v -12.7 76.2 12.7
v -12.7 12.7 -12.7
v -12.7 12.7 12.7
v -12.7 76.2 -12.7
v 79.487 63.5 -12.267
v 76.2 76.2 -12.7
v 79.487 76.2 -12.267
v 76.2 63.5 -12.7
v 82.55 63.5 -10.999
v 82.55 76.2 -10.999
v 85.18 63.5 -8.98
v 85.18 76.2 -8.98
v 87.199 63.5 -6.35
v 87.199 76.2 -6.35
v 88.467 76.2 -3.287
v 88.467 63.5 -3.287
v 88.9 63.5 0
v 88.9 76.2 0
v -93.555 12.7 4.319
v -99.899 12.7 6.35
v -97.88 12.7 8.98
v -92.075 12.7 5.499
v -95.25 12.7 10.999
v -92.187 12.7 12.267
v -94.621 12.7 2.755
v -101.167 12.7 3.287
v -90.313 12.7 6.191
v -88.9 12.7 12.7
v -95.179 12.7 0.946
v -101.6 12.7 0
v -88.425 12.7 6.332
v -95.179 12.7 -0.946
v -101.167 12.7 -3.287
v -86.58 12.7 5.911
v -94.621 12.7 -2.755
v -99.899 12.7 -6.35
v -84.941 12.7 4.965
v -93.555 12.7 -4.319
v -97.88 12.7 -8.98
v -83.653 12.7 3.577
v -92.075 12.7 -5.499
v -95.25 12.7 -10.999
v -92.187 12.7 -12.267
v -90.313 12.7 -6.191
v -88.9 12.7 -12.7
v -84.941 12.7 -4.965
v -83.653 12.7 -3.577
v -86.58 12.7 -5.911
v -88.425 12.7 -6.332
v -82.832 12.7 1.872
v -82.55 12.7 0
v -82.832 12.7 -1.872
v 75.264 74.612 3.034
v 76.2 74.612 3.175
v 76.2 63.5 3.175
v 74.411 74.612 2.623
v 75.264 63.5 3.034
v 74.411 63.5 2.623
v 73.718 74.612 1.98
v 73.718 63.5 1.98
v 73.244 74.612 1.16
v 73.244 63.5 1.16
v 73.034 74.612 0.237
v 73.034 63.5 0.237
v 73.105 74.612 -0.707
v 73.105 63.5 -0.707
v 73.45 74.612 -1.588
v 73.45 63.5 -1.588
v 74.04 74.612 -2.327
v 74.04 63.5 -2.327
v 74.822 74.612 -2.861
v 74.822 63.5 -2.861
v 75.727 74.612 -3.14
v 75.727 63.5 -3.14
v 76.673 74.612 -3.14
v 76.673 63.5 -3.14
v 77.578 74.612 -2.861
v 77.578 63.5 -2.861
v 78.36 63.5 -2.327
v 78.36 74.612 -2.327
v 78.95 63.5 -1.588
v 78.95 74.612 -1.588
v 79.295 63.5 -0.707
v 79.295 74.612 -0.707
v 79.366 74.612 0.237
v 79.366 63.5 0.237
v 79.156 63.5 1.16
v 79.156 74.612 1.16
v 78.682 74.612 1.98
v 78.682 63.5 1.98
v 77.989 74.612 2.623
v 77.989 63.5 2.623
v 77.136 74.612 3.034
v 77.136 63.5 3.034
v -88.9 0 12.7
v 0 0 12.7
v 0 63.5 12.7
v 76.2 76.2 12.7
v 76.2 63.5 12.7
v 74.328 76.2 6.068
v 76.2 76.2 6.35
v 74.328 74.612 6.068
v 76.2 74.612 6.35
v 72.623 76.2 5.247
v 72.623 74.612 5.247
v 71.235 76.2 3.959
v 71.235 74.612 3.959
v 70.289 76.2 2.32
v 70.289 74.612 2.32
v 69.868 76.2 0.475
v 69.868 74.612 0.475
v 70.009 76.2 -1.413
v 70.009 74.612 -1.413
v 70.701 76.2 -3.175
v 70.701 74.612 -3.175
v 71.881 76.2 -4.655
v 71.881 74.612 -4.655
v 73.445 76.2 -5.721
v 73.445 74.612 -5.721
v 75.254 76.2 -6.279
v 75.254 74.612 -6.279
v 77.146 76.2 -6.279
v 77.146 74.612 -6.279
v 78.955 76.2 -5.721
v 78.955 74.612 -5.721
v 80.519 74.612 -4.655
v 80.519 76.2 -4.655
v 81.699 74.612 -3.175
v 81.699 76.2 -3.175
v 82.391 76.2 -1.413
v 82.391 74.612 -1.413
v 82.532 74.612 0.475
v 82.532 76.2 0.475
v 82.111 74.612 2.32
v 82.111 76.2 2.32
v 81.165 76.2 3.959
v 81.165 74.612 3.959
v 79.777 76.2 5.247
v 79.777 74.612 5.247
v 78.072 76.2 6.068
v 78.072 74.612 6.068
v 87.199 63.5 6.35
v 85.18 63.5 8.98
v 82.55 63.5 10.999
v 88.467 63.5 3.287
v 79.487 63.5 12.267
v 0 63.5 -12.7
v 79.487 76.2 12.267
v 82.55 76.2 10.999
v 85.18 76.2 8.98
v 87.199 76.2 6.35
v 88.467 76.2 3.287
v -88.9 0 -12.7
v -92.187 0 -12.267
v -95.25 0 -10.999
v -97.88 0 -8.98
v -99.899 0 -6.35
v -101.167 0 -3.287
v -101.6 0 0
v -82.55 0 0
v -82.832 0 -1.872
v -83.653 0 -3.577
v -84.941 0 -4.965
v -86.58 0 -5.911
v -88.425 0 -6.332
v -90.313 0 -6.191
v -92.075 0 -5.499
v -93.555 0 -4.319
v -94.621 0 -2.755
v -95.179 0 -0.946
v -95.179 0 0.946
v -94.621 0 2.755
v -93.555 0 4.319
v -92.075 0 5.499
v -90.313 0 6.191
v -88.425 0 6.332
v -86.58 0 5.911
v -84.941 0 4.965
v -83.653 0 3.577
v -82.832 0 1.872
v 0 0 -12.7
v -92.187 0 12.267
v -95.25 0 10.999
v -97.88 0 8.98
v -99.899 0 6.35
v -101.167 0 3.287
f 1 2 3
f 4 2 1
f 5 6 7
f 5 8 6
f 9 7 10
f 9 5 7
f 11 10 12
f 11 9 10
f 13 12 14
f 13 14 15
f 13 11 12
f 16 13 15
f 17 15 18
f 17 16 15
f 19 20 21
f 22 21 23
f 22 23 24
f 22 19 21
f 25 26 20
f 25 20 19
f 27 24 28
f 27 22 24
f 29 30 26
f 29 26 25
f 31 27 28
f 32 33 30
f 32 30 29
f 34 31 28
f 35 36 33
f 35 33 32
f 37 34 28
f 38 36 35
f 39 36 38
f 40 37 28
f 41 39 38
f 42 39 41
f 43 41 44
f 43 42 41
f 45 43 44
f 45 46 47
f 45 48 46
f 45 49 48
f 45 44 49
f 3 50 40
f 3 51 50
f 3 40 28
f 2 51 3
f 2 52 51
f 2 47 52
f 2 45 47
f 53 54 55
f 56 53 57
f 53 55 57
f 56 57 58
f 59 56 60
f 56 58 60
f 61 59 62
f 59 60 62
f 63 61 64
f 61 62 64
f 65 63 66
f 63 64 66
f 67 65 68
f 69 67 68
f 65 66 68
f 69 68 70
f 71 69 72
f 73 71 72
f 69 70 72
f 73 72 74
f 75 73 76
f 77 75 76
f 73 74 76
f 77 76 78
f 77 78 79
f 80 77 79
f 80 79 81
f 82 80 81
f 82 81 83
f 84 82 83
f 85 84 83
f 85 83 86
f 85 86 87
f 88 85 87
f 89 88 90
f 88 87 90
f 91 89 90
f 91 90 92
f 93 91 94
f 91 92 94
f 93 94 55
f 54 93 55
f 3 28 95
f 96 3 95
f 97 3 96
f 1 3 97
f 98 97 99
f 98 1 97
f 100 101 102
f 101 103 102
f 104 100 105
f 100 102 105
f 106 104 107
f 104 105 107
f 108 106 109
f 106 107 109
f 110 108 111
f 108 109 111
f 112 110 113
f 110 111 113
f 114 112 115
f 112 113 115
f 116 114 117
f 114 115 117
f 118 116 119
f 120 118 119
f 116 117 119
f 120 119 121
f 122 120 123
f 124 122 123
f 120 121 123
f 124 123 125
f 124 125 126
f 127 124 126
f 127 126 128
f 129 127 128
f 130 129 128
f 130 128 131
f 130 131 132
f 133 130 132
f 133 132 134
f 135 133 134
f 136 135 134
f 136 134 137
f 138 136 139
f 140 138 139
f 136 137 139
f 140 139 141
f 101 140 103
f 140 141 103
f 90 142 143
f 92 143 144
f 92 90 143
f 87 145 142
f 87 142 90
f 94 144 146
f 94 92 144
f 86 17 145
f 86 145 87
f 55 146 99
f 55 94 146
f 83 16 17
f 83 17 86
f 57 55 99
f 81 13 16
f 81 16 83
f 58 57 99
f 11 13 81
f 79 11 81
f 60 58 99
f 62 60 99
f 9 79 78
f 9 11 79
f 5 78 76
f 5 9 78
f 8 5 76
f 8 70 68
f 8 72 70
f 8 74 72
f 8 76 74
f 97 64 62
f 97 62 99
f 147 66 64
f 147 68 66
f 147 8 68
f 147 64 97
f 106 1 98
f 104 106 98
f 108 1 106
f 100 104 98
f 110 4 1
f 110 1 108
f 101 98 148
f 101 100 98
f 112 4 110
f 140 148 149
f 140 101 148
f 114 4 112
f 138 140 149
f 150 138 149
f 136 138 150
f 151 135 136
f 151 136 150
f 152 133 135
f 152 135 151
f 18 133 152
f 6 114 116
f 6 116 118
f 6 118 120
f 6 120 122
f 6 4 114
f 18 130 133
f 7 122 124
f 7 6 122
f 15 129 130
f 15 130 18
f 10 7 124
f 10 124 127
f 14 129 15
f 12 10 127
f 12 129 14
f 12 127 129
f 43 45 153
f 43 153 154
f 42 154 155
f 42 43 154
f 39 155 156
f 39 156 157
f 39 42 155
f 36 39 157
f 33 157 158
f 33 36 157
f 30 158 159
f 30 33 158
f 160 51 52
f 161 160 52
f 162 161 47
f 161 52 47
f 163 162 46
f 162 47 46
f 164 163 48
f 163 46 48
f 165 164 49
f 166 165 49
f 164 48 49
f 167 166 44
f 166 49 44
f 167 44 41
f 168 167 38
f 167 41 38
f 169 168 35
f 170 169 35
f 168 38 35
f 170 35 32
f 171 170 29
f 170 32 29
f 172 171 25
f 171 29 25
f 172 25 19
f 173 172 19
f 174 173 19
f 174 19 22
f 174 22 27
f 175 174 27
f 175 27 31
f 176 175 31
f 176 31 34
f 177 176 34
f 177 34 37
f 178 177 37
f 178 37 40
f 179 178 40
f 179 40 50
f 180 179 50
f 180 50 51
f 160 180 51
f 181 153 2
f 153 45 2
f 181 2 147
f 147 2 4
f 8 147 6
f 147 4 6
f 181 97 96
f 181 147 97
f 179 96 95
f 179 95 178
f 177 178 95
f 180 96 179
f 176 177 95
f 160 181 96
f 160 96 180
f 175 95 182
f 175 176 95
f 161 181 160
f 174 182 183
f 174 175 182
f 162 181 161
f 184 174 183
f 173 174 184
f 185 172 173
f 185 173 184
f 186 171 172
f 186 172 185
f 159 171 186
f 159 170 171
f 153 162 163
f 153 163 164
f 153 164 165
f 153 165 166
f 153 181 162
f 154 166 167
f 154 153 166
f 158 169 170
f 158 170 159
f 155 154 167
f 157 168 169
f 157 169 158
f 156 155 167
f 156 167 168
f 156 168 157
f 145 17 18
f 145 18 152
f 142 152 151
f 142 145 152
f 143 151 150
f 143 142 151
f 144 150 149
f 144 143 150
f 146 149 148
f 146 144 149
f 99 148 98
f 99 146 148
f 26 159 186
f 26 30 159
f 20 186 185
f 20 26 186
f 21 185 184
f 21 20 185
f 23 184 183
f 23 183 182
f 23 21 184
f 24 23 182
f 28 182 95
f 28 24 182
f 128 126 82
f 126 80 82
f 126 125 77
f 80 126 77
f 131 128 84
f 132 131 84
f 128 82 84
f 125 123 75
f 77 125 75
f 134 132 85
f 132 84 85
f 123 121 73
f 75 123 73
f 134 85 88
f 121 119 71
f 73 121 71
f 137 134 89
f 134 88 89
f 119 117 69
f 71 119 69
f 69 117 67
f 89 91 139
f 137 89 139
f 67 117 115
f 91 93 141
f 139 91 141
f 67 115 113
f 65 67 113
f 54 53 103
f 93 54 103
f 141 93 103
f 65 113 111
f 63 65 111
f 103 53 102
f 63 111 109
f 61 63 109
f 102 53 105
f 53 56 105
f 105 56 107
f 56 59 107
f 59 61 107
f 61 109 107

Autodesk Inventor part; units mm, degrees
ref_plane "YZ Plane" through (0, 0, 0) normal (1, 0, 0) x (0, 1, 0)
ref_plane "XZ Plane" through (0, 0, 0) normal (0, 1, 0) x (-1, 0, 0)
ref_plane "XY Plane" through (0, 0, 0) normal (0, 0, 1) x (1, 0, 0)
sketch "Sketch1" plane through (0, 0, 0) normal (0, 0, 1) x (1, 0, 0)
  line L0 (0, 0) -> (-101.6, 0)
  line L1 (-101.6, 0) -> (-101.6, 12.7)
  line L2 (-101.6, 12.7) -> (-12.7, 12.7)
  line L3 (0, 12.7) -> (0, 0)
  line L4 (0, 0) -> (-12.7, 0)
  line L5 (-12.7, 12.7) -> (-12.7, 76.2)
  line L6 (-12.7, 76.2) -> (88.9, 76.2)
  line L7 (88.9, 76.2) -> (88.9, 63.5)
  line L8 (88.9, 63.5) -> (0, 63.5)
  line L9 (0, 63.5) -> (0, 12.7)
  dimension "d0" = 101.6
  dimension "d4" = 12.7
  dimension "d5" = 12.7
  dimension "d6" = 12.7
  dimension "d7" = 76.2
  dimension "d8" = 101.6
  dimension "d9" = 12.7
  dimension "d10" = 88.9
extrude "Extrusion1" add sketch "Sketch1" along normal mid plane 25.4
fillet "Fillet1" radius 12.7 1 edges at (88.9, 69.85, -12.7)
fillet "Fillet2" radius 12.7 1 edges at (88.9, 69.85, 12.7)
fillet "Fillet3" radius 12.7 1 edges at (-101.6, 6.35, -12.7)
fillet "Fillet4" radius 12.7 1 edges at (-101.6, 6.35, 12.7)
sketch "Sketch2" plane through (-12.7, 12.7, 12.7) normal (0, 1, 0) x (1, 0, 0)
  arc A0 (-76.2, 25.4) -> (-76.2, 0) centre (-76.2, 12.7) ccw projected
  circle A1 centre (-76.2, 12.7) radius 6.35
  point P0 (12.7, 12.7)
  dimension "d17" = 12.7
extrude "Extrusion2" cut sketch "Sketch2" against normal blind 25.4
sketch "Sketch3" plane through (-12.7, 76.2, 12.7) normal (0, 1, 0) x (1, 0, 0)
  arc A0 (88.9, 0) -> (88.9, 25.4) centre (88.9, 12.7) ccw projected
  point P0 (12.7, 12.7)
hole "Hole1" at (76.2, 76.2, 0) direction (0, -1, 0) diameter 6.35 end through all counterbore diameter 12.7 counterbore depth 1.5875
